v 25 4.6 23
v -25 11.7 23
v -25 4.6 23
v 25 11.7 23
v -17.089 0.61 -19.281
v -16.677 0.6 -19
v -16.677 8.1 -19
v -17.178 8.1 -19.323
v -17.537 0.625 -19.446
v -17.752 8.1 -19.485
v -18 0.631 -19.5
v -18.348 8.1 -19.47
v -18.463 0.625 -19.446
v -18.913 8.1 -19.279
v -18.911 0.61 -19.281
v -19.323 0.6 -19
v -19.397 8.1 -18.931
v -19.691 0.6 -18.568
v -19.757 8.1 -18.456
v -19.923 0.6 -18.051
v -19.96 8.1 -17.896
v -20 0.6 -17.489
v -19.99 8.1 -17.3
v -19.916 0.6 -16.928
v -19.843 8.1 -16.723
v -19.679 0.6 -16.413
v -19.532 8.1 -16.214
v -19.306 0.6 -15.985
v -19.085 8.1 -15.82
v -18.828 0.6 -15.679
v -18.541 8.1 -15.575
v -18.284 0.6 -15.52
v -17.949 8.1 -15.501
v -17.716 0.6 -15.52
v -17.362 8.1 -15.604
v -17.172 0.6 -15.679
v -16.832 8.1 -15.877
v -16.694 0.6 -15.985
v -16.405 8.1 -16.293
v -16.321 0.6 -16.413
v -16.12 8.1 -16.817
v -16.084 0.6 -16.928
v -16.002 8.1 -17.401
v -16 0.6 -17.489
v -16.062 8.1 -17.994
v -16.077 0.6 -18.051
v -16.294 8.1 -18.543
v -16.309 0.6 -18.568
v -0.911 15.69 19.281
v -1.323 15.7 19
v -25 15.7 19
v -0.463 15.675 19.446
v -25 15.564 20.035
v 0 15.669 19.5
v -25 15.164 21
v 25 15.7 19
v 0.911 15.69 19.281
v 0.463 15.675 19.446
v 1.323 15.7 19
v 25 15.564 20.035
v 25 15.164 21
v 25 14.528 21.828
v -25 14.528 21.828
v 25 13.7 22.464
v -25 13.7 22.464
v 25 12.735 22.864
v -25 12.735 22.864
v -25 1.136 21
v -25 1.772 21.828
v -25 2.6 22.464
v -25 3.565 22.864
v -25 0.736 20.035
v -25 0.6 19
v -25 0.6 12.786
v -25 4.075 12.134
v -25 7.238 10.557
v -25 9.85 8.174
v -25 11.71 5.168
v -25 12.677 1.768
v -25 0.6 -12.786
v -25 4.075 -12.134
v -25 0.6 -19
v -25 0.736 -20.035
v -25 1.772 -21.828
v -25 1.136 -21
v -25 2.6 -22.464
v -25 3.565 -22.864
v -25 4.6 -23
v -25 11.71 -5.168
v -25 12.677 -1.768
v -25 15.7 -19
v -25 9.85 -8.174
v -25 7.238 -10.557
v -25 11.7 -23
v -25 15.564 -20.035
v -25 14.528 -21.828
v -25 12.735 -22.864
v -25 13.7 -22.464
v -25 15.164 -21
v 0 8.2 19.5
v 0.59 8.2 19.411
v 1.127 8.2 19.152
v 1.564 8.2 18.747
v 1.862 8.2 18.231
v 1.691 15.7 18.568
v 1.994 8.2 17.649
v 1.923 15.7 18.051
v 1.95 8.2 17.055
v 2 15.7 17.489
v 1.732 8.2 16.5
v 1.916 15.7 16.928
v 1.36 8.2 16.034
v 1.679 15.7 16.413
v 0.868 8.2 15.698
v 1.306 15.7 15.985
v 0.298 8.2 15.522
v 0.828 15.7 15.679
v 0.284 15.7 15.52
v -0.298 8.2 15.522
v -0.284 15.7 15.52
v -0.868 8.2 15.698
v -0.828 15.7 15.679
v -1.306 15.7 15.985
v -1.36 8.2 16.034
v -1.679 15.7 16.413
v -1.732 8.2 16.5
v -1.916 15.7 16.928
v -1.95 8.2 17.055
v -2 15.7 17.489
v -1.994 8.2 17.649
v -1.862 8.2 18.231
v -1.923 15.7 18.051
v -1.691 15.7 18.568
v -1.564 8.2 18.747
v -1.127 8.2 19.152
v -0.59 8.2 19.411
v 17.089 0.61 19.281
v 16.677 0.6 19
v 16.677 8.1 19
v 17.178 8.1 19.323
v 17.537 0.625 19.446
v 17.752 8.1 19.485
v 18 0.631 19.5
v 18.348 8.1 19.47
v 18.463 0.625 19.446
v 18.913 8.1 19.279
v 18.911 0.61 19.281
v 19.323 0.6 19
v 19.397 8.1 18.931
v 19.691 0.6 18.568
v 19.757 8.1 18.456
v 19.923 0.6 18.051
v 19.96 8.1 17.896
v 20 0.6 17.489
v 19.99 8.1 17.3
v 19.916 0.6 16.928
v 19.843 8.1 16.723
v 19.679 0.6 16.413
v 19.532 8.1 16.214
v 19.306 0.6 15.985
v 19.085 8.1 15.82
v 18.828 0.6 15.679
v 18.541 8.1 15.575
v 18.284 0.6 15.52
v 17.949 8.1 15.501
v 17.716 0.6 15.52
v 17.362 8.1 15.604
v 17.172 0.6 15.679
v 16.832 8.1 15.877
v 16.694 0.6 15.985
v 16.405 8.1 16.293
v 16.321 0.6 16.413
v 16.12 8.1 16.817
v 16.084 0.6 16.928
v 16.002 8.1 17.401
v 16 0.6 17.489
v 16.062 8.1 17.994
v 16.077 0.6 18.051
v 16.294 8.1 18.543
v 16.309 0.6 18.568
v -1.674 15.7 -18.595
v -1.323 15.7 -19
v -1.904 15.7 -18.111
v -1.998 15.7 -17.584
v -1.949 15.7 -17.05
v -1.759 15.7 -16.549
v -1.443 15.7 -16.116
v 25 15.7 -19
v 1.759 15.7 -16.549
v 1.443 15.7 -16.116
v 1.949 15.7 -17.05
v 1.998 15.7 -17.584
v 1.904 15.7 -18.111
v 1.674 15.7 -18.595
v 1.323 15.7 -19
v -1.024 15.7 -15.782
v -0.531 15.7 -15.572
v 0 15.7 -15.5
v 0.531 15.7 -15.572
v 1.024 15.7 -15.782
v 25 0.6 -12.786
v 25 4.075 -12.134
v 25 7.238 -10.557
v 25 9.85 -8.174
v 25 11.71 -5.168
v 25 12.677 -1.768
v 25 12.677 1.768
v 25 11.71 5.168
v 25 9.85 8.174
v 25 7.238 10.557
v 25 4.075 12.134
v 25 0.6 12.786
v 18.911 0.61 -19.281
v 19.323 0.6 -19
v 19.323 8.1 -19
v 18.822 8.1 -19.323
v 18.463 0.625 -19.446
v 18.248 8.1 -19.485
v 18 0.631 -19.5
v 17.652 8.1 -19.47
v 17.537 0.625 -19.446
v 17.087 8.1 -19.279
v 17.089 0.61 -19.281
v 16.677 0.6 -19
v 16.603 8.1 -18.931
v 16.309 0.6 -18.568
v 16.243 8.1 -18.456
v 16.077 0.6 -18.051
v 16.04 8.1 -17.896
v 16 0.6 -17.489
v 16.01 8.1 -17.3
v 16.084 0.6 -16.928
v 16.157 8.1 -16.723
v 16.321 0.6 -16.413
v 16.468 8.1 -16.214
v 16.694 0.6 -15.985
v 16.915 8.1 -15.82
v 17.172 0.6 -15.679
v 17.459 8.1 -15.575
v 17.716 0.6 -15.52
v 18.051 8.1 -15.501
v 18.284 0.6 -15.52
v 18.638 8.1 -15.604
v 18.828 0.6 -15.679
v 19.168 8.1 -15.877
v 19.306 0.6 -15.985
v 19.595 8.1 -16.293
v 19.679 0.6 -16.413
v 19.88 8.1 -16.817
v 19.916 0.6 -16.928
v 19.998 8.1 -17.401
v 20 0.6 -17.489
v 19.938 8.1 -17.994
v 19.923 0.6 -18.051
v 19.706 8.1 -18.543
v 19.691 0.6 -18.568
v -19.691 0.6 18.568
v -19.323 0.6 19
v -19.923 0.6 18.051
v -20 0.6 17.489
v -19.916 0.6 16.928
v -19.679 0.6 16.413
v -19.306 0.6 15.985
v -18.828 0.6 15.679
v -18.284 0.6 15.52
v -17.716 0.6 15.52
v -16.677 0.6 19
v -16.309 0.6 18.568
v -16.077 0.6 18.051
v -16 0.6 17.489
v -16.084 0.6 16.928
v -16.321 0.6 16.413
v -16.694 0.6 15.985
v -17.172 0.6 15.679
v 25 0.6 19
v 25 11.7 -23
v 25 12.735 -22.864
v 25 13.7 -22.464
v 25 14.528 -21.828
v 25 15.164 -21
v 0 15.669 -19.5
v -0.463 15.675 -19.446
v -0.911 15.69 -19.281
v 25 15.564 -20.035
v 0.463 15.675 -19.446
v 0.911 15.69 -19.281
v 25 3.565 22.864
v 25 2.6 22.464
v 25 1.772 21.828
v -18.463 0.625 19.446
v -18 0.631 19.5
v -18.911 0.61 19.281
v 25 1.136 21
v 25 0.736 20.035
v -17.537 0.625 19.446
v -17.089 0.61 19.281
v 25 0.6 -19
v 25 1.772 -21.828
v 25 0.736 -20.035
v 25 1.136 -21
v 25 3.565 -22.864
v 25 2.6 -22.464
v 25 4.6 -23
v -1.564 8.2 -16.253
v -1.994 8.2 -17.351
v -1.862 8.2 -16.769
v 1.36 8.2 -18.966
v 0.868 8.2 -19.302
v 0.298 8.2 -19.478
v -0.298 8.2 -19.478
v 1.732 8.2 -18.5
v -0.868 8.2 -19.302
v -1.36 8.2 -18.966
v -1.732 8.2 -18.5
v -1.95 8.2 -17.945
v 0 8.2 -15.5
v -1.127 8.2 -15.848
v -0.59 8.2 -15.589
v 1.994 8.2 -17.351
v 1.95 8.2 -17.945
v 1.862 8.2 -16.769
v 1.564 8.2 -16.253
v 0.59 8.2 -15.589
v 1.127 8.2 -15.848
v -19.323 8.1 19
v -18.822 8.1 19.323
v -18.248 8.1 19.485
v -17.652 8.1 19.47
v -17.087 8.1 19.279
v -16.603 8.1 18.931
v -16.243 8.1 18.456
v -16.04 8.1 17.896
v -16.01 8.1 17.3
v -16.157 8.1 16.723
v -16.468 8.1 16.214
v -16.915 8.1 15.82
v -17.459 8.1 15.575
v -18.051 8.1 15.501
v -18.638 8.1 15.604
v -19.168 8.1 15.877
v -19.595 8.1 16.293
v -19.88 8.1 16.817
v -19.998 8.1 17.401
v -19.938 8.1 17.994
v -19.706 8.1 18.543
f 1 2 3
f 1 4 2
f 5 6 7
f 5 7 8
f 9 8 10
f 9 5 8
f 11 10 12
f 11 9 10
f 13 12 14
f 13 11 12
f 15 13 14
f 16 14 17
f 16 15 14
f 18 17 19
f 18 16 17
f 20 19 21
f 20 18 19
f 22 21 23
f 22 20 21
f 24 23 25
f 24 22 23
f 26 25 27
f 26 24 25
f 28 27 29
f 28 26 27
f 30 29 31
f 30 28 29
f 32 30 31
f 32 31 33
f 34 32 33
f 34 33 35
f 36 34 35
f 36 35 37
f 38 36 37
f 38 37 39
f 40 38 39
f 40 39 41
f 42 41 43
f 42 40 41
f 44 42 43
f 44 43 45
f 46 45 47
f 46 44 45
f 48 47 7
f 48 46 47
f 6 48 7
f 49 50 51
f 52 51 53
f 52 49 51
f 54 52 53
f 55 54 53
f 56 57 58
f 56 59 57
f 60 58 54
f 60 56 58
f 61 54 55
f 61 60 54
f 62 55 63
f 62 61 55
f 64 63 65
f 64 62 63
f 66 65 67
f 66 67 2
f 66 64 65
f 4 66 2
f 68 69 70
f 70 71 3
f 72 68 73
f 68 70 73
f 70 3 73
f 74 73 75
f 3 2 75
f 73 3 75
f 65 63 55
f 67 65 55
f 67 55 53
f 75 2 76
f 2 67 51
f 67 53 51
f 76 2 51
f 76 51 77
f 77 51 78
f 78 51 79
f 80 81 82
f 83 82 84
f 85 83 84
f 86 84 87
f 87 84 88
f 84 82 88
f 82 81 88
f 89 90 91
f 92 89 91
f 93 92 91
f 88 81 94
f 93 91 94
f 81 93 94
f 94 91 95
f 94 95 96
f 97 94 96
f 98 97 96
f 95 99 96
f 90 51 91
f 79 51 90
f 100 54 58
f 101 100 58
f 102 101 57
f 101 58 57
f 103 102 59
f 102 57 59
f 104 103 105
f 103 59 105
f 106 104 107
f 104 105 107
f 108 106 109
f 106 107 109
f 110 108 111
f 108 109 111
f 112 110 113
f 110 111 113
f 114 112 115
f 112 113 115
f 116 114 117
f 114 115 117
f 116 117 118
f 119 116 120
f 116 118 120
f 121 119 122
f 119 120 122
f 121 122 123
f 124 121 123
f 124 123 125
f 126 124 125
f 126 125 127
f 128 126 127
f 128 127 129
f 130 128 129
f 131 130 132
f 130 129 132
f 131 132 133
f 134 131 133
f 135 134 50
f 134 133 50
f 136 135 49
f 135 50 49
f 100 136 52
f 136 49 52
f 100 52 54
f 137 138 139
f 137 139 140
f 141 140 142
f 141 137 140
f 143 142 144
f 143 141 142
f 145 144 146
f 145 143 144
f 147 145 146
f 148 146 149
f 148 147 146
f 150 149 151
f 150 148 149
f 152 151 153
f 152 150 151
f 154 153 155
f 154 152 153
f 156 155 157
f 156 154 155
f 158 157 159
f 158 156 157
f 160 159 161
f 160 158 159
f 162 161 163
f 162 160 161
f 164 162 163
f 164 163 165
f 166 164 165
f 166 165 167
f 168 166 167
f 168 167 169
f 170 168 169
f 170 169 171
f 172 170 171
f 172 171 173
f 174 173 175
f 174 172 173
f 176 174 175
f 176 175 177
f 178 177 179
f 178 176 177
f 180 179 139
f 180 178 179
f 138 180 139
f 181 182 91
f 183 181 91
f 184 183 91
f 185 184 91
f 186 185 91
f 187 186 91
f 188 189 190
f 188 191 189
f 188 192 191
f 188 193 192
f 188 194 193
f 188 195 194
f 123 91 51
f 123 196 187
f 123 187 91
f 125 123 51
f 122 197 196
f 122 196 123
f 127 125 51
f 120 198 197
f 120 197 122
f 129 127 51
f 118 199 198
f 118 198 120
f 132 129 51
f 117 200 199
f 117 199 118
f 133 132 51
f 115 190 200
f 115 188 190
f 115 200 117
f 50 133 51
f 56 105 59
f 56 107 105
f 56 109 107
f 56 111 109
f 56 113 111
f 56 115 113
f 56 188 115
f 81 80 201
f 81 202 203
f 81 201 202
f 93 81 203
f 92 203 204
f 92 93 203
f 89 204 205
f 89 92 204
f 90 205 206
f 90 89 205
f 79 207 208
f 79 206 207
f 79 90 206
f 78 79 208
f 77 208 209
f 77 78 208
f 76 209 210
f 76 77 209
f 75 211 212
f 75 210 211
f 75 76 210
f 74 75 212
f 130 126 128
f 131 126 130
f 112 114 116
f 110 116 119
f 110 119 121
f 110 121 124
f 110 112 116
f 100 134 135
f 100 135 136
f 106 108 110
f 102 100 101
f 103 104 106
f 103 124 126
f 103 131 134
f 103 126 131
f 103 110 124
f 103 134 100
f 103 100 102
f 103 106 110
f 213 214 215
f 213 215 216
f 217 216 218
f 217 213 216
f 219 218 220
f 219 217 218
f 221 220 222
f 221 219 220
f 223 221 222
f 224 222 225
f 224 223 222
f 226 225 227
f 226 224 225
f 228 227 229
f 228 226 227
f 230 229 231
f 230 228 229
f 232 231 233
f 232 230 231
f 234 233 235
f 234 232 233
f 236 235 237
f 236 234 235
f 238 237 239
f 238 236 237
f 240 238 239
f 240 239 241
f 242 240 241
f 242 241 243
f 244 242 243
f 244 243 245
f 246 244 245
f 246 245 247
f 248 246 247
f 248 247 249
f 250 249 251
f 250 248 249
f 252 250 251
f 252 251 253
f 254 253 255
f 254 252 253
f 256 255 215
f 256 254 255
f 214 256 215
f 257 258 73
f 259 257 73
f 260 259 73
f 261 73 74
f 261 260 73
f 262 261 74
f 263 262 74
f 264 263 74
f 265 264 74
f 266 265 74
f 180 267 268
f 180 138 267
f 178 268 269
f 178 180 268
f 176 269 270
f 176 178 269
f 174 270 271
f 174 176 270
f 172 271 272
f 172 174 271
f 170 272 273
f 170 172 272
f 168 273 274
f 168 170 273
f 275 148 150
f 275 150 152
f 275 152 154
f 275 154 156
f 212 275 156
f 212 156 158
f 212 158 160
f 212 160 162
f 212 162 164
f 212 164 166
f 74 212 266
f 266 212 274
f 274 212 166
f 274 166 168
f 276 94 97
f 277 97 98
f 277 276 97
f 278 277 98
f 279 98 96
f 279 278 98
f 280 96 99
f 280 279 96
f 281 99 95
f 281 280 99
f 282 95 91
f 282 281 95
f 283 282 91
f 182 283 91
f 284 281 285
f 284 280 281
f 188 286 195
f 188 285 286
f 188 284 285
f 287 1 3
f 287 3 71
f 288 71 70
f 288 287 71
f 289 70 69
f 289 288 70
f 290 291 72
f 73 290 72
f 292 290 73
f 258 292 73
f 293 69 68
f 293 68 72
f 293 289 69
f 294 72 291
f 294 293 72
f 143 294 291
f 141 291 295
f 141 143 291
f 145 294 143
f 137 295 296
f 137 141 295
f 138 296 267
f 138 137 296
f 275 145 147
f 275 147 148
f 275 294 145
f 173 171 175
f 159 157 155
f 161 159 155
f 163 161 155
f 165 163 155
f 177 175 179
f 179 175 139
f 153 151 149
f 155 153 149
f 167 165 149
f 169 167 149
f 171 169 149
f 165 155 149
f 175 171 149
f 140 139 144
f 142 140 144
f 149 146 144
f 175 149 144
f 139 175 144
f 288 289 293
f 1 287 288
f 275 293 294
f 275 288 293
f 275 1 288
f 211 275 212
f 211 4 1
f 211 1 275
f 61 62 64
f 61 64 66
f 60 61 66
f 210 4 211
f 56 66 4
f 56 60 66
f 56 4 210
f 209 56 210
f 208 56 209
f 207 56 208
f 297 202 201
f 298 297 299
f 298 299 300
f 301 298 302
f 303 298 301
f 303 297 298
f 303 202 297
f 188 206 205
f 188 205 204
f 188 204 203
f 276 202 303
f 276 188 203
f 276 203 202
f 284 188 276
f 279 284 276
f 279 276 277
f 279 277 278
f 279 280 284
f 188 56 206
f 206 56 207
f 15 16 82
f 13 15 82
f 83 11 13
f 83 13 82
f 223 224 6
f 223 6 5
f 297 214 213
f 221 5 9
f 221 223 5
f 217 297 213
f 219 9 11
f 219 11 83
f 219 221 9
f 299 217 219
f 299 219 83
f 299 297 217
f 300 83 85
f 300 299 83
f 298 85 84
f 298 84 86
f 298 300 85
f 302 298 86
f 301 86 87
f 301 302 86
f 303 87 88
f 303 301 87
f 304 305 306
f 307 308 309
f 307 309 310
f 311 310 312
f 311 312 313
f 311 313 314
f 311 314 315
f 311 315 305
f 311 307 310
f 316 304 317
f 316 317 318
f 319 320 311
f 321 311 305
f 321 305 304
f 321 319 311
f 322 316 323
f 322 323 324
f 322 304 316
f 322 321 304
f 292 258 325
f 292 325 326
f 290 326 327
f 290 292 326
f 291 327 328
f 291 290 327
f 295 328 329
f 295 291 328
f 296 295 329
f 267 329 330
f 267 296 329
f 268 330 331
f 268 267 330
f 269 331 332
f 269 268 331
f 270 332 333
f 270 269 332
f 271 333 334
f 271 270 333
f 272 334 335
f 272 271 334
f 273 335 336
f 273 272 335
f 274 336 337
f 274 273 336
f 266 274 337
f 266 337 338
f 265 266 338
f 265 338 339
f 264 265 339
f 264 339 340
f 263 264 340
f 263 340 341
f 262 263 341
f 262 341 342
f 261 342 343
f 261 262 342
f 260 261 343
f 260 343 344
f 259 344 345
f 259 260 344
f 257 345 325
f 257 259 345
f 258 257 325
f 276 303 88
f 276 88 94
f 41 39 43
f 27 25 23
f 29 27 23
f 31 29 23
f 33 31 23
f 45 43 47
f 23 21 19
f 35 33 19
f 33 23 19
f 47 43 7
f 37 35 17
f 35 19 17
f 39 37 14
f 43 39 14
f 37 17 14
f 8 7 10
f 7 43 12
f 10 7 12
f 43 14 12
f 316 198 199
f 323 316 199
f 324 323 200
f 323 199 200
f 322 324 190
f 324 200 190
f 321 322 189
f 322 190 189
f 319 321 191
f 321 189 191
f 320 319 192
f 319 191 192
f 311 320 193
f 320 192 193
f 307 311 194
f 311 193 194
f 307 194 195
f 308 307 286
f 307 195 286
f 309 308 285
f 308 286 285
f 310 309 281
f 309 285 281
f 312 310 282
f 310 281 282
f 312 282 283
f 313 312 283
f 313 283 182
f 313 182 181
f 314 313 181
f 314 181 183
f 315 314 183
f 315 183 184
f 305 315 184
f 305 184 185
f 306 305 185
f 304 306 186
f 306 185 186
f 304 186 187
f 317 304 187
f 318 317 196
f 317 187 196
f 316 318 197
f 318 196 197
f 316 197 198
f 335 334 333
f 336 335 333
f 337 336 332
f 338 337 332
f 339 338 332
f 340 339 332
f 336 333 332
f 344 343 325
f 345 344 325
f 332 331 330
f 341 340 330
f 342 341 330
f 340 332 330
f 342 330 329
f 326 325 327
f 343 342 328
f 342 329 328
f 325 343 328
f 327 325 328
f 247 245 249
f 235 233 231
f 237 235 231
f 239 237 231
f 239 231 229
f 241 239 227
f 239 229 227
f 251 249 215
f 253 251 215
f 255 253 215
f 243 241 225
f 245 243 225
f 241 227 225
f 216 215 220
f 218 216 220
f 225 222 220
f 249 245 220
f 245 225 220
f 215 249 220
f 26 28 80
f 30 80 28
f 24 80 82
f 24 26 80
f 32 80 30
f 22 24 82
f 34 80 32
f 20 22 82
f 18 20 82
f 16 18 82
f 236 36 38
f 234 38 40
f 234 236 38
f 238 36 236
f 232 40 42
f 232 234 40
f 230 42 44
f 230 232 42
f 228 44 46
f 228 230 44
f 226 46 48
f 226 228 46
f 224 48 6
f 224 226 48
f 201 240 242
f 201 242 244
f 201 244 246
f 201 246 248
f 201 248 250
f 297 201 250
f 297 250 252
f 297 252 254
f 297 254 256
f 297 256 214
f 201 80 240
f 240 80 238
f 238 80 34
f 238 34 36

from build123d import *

# Parameters (mm, degrees)
BOSS_EXTRUDE1_DEPTH     = 25
CUT_EXTRUDE1_DEPTH      = 38.423121195
CUT_EXTRUDE1_DEPTH_BACK = 38.423121195
SKETCH2_R               = 12.8
SKETCH3_R               = 2
CUT_EXTRUDE2_DEPTH      = 7.5
SKETCH4_R               = 2
CUT_EXTRUDE3_DEPTH      = 7.5


with BuildPart() as part:
    # Sketch1 → Boss-Extrude1 (new, symmetric)
    with BuildSketch(Plane(origin=(0, 0, 0), x_dir=(0, 0, -1), z_dir=(1, 0, 0))):
        with BuildLine():
            Line((-19, 0.6), (19, 0.6))
            ThreePointArc((19, 0.6), (21.828427125, 1.771572875), (23, 4.6))
            Line((23, 4.6), (23, 11.7))
            ThreePointArc((23, 11.7), (21.828427125, 14.528427125), (19, 15.7))
            Line((19, 15.7), (-19, 15.7))
            ThreePointArc((-19, 15.7), (-21.828427125, 14.528427125), (-23, 11.7))
            Line((-23, 11.7), (-23, 4.6))
            ThreePointArc((-23, 4.6), (-21.828427125, 1.771572875), (-19, 0.6))
        make_face()
    extrude(amount=BOSS_EXTRUDE1_DEPTH, both=True)

    # Sketch2 → Cut-Extrude1 (cut, two sides: drawn at the far end of the back side and taken through both)
    with BuildSketch(Plane(origin=(0, 0, 0), x_dir=(0, 0, -1), z_dir=(1, 0, 0)).offset(-CUT_EXTRUDE1_DEPTH_BACK)):
        Circle(SKETCH2_R)
    extrude(amount=CUT_EXTRUDE1_DEPTH + CUT_EXTRUDE1_DEPTH_BACK, mode=Mode.SUBTRACT)

    # Sketch3 → Cut-Extrude2 (cut)
    with BuildSketch(Plane(origin=(0, 0.6, 0), x_dir=(1, 0, 0), z_dir=(0, 1, 0))):
        with Locations(Location((18, -17.5, 0), (0, 0, 228.590377891))):
            Circle(SKETCH3_R)
        with Locations(Location((18, 17.5, 0), (0, 0, 48.590377891))):
            Circle(SKETCH3_R)
        with Locations(Location((-18, -17.5, 0), (0, 0, 228.590377891))):
            Circle(SKETCH3_R)
        with Locations(Location((-18, 17.5, 0), (0, 0, 48.590377891))):
            Circle(SKETCH3_R)
    extrude(amount=CUT_EXTRUDE2_DEPTH, mode=Mode.SUBTRACT)

    # Sketch4 → Cut-Extrude3 (cut)
    with BuildSketch(Plane(origin=(0, 15.7, 0), x_dir=(1, 0, 0), z_dir=(0, 1, 0))):
        with Locations(Location((0, -17.5, 0), (0, 0, 270))):
            Circle(SKETCH4_R)
        with Locations(Location((0, 17.5, 0), (0, 0, 270))):
            Circle(SKETCH4_R)
    extrude(amount=-CUT_EXTRUDE3_DEPTH, mode=Mode.SUBTRACT)


solid = part.part
